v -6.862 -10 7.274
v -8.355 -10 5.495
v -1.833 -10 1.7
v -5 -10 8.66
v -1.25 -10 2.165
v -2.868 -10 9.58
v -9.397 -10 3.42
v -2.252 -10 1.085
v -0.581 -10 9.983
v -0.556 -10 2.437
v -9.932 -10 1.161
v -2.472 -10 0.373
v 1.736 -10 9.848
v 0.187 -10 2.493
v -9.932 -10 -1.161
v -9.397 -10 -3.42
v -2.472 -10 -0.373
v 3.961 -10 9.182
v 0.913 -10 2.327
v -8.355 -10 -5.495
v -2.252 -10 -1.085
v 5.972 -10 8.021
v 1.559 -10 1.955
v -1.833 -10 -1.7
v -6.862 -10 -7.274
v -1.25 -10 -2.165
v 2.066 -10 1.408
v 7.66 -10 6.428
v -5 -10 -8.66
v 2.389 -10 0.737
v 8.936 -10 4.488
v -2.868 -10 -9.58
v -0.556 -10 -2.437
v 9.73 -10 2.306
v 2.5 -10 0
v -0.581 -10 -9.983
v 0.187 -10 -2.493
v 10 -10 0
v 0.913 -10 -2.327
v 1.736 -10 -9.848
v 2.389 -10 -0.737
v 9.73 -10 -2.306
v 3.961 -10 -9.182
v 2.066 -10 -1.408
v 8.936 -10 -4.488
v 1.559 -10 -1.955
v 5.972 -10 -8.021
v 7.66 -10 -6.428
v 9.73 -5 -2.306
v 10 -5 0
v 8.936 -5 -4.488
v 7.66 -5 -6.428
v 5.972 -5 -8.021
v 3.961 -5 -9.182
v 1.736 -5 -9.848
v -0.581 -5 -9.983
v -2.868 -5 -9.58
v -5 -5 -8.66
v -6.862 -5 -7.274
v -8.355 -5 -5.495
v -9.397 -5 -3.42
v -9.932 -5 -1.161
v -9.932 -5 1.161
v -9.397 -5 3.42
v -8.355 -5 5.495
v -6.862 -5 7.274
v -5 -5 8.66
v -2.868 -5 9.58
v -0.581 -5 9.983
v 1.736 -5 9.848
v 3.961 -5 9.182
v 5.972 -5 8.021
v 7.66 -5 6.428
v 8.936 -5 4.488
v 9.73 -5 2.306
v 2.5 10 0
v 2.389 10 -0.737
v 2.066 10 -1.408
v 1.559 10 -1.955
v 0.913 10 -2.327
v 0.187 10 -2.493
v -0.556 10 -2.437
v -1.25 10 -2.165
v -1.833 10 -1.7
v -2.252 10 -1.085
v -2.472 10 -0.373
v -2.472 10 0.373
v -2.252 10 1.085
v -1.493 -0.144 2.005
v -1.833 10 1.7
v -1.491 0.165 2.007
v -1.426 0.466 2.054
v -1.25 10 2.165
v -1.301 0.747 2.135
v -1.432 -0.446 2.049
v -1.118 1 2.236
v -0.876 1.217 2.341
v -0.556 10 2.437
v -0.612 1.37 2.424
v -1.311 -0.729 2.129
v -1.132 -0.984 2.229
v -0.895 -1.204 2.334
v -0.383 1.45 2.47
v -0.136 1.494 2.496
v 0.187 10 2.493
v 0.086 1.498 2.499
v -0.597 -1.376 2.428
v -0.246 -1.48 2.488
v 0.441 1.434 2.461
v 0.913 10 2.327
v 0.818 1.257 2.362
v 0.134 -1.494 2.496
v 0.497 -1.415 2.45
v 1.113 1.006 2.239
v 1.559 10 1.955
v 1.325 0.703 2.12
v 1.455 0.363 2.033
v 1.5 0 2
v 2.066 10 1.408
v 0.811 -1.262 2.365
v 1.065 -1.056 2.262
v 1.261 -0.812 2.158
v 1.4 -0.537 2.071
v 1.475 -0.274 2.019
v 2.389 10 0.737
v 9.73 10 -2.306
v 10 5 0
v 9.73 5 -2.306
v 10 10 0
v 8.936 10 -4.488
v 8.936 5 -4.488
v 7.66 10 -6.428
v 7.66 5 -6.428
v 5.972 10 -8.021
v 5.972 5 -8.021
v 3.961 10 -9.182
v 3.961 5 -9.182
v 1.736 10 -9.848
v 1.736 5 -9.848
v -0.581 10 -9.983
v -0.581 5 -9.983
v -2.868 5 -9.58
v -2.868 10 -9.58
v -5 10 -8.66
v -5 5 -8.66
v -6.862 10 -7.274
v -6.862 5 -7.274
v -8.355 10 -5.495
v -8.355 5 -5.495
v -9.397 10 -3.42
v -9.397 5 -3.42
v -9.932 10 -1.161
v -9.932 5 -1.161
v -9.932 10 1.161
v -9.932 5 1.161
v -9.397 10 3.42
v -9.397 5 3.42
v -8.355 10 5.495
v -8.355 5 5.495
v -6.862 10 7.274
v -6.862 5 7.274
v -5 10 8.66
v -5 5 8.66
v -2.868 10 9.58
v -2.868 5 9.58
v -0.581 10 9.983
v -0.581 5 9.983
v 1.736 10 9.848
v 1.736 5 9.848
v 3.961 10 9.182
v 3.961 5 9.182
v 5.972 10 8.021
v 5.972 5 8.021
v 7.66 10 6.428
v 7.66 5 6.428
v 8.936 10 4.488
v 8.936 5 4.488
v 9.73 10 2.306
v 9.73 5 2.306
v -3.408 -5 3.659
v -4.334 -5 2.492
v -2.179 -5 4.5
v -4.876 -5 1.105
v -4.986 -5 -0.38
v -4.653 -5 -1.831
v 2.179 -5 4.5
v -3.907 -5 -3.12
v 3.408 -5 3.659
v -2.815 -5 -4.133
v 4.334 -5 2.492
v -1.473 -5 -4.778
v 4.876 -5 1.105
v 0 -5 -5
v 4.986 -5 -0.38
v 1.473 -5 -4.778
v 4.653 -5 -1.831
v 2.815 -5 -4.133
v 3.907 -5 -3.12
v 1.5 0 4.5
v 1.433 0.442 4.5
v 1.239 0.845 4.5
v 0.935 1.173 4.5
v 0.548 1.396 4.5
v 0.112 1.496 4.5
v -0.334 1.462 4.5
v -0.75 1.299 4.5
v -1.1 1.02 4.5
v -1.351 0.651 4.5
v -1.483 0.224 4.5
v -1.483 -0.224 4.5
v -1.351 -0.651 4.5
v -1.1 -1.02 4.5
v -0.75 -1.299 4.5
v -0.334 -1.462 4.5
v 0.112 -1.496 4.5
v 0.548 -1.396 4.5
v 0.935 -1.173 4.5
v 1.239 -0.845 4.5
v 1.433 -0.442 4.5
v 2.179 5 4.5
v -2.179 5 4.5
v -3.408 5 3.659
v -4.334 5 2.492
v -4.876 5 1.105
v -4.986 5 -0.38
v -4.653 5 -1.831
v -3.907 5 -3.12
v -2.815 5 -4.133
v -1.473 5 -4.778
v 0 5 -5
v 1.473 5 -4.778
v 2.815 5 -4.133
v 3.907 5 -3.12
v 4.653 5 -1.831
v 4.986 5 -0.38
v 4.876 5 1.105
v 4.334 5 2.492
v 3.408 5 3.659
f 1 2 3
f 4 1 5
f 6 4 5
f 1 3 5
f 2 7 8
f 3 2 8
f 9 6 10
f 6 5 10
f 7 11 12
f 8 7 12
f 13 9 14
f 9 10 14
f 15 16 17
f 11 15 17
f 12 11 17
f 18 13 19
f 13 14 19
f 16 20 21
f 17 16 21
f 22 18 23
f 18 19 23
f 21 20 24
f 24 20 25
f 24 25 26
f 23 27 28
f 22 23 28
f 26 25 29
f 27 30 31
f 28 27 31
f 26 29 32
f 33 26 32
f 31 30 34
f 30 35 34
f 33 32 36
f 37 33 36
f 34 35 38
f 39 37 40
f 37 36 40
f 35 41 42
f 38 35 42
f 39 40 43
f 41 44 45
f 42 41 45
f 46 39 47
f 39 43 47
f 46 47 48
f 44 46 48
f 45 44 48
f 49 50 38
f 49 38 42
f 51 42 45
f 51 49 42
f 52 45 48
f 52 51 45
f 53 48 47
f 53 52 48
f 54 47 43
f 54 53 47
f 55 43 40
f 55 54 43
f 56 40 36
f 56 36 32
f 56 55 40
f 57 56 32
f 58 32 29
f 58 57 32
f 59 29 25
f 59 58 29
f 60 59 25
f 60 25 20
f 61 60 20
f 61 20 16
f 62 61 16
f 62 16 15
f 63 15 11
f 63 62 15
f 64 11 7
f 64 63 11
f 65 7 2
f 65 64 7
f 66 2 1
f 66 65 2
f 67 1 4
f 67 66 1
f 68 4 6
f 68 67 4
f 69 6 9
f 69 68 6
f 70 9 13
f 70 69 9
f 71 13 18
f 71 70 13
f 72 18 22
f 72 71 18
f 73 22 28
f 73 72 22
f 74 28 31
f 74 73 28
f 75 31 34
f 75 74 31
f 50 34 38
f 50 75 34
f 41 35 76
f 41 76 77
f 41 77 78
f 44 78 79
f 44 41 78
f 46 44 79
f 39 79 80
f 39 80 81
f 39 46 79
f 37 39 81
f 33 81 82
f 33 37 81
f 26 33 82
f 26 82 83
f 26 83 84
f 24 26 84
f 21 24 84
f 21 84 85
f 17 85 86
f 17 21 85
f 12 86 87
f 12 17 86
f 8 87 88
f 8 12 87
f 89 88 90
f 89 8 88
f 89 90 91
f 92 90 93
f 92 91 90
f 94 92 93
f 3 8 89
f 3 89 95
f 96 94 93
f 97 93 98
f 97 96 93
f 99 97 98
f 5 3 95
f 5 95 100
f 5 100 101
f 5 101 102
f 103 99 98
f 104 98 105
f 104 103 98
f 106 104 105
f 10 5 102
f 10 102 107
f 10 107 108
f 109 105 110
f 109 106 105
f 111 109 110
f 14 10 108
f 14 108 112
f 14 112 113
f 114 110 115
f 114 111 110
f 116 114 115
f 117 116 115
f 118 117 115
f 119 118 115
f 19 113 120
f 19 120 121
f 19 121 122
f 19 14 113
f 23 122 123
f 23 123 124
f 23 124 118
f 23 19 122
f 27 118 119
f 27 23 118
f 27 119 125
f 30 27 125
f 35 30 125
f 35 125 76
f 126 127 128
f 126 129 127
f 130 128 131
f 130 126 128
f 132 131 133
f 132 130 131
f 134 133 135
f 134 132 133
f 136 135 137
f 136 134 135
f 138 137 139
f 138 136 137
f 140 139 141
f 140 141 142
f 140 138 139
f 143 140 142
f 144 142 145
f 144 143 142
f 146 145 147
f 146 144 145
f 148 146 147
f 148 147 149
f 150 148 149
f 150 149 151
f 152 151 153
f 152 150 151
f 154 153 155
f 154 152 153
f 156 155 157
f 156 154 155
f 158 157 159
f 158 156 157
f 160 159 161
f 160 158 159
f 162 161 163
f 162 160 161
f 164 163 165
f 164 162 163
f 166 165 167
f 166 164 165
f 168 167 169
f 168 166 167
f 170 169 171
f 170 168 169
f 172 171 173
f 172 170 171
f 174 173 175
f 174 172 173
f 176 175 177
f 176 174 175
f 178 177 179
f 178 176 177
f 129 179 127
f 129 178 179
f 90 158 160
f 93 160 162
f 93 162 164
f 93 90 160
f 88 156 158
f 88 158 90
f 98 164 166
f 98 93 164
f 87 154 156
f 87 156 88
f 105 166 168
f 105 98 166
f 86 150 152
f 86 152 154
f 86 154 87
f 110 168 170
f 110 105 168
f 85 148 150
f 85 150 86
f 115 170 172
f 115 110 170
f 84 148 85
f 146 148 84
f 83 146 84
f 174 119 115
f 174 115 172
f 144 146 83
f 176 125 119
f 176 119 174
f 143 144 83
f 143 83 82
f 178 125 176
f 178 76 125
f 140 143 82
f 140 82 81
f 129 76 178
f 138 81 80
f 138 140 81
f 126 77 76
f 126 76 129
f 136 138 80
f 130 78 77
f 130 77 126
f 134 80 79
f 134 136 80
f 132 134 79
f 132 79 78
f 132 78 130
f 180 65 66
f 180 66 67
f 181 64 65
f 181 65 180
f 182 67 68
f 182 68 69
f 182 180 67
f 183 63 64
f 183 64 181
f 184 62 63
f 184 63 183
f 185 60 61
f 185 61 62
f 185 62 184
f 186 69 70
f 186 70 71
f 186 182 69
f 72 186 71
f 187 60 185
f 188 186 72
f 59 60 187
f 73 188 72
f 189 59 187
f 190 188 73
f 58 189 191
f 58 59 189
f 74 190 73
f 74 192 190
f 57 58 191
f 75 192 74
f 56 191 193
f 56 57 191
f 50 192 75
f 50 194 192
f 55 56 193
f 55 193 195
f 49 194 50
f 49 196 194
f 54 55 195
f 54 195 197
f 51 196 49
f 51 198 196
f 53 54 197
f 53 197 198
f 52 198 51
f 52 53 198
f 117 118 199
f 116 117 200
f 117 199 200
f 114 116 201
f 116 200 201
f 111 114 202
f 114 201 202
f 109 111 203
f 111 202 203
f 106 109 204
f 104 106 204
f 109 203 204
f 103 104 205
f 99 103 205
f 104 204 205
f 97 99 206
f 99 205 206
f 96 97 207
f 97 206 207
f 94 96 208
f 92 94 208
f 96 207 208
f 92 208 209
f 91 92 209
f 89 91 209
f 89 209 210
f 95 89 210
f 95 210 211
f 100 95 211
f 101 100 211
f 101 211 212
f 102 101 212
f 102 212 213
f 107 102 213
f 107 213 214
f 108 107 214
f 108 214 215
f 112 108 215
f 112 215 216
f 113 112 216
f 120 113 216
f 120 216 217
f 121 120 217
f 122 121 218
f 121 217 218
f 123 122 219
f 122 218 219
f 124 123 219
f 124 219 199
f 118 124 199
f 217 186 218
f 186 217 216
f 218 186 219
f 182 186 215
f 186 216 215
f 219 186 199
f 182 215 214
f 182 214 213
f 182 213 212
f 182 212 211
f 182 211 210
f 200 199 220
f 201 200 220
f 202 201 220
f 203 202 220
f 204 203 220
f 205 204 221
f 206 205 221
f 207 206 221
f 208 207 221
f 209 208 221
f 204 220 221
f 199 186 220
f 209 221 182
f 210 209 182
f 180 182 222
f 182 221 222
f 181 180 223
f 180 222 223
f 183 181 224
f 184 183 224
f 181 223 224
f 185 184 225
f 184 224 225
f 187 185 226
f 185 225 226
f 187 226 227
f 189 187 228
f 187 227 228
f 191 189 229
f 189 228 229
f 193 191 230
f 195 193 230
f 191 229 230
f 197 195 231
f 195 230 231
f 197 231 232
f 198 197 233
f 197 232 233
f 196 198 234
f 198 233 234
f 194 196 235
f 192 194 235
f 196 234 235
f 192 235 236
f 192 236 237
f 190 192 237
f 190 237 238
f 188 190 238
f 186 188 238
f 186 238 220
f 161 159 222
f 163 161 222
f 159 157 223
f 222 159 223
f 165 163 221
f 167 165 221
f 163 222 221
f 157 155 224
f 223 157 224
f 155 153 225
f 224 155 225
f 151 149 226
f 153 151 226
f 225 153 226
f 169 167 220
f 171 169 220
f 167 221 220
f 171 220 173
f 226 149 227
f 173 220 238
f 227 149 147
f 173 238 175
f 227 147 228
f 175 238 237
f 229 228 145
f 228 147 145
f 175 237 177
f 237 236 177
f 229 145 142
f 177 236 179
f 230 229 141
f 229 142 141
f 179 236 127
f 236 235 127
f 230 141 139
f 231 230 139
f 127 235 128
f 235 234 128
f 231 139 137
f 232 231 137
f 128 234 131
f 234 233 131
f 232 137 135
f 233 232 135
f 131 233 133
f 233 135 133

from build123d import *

# Parameters (mm, degrees)
SKETCH1_R           = 10
SKETCH1_R_2         = 2.5
BOSS_EXTRUDE1_DEPTH = 10
SKETCH1_3_R         = 10
CUT_EXTRUDE1_DEPTH  = 5
CUT_EXTRUDE2_REACH  = 22.255
SKETCH4_R           = 1.5


with BuildPart() as part:
    # Sketch1 → Boss-Extrude1 (new, symmetric)
    with BuildSketch(Plane(origin=(0, 0, 0), x_dir=(1, 0, 0), z_dir=(0, 1, 0))):
        Circle(SKETCH1_R)
        Circle(SKETCH1_R_2, mode=Mode.SUBTRACT)
    extrude(amount=BOSS_EXTRUDE1_DEPTH, both=True)

    # Sketch1<3> → Cut-Extrude1 (cut, symmetric)
    with BuildSketch(Plane(origin=(0, 0, 0), x_dir=(1, 0, 0), z_dir=(0, 1, 0))):
        Circle(SKETCH1_3_R)
        with BuildLine():
            Line((2.179449472, -4.5), (-2.179449472, -4.5))
            ThreePointArc((-2.179449472, -4.5), (0, 5), (2.179449472, -4.5))
        make_face(mode=Mode.SUBTRACT)
    extrude(amount=CUT_EXTRUDE1_DEPTH, both=True, mode=Mode.SUBTRACT)

    # Sketch4 → Cut-Extrude2 (cut, up to next)
    with BuildSketch(Plane.XY.offset(4.5), mode=Mode.PRIVATE) as cut_extrude2_sk1:
        Circle(SKETCH4_R)
    cut_extrude2_tool1 = extrude(cut_extrude2_sk1.sketch, amount=-CUT_EXTRUDE2_REACH, mode=Mode.PRIVATE) & part.part
    add(cut_extrude2_tool1.solids().sort_by_distance((0, 0, 4.5))[0], mode=Mode.SUBTRACT)


solid = part.part
